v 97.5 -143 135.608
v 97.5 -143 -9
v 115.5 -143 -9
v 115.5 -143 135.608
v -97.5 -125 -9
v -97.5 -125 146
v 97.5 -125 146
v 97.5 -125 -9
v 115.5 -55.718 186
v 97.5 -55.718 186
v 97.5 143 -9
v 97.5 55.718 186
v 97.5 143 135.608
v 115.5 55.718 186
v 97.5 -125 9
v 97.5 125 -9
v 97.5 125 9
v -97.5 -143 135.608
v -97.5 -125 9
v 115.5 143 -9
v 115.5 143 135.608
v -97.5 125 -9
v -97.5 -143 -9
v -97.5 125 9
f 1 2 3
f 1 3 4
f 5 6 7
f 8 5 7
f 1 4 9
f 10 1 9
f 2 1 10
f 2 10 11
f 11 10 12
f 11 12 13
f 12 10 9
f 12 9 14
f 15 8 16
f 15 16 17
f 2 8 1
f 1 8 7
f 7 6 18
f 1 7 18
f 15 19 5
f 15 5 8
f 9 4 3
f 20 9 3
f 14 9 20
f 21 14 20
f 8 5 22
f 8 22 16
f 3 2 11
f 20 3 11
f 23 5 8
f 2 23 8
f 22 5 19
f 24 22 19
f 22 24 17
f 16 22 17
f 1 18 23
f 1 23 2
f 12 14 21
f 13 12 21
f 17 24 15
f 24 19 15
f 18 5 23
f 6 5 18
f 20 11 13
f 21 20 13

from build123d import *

# Parameters (mm, degrees)
F0_W      = 195
F0_H      = 18
F1_DEPTH  = 125
F3_W      = 195
F3_H      = 155
F4_DEPTH  = 18
F7_DEPTH  = 195.001
F8_W      = 286
F8_H      = 195
F9_DEPTH  = 18
F11_DEPTH = 213.001


with BuildPart() as f1:
    # F0 (on Front) → F1 (new body, symmetric)
    with BuildSketch(Plane.XZ):
        Rectangle(F0_W, F0_H)
    extrude(amount=F1_DEPTH, both=True)


with BuildPart() as f4:
    # F3 (on offset) → F4 (new body)
    with BuildSketch(Plane.XZ.offset(125)):
        with Locations((0, 68.5)):
            Rectangle(F3_W, F3_H)
    extrude(amount=F4_DEPTH)

    # F6 (on face) → F7 (cut, through all)
    with BuildSketch(Plane(origin=(-97.5, 0, 0), x_dir=(0, -1, 0), z_dir=(-1, 0, 0))):
        Polygon((143, 146), (125, 146), (143, 135.607695), align=None)
    extrude(amount=-F7_DEPTH, mode=Mode.SUBTRACT)


with BuildPart() as f9:
    # F8 (on offset) → F9 (new body)
    with BuildSketch(Plane.YZ.offset(97.5)):
        with Locations((0, 88.5)):
            Rectangle(F8_W, F8_H)
    extrude(amount=F9_DEPTH)

    # F10 (on face) → F11 (cut, through all)
    with BuildSketch(Plane.YZ.offset(115.5)):
        Polygon((-143, 186), (-143, 135.607695), (-55.717968, 186), align=None)
        Polygon((55.718496, 186), (143, 135.608), (143, 186), align=None)
    extrude(amount=-F11_DEPTH, mode=Mode.SUBTRACT)


solid = Compound([f1.part, f4.part, f9.part])
